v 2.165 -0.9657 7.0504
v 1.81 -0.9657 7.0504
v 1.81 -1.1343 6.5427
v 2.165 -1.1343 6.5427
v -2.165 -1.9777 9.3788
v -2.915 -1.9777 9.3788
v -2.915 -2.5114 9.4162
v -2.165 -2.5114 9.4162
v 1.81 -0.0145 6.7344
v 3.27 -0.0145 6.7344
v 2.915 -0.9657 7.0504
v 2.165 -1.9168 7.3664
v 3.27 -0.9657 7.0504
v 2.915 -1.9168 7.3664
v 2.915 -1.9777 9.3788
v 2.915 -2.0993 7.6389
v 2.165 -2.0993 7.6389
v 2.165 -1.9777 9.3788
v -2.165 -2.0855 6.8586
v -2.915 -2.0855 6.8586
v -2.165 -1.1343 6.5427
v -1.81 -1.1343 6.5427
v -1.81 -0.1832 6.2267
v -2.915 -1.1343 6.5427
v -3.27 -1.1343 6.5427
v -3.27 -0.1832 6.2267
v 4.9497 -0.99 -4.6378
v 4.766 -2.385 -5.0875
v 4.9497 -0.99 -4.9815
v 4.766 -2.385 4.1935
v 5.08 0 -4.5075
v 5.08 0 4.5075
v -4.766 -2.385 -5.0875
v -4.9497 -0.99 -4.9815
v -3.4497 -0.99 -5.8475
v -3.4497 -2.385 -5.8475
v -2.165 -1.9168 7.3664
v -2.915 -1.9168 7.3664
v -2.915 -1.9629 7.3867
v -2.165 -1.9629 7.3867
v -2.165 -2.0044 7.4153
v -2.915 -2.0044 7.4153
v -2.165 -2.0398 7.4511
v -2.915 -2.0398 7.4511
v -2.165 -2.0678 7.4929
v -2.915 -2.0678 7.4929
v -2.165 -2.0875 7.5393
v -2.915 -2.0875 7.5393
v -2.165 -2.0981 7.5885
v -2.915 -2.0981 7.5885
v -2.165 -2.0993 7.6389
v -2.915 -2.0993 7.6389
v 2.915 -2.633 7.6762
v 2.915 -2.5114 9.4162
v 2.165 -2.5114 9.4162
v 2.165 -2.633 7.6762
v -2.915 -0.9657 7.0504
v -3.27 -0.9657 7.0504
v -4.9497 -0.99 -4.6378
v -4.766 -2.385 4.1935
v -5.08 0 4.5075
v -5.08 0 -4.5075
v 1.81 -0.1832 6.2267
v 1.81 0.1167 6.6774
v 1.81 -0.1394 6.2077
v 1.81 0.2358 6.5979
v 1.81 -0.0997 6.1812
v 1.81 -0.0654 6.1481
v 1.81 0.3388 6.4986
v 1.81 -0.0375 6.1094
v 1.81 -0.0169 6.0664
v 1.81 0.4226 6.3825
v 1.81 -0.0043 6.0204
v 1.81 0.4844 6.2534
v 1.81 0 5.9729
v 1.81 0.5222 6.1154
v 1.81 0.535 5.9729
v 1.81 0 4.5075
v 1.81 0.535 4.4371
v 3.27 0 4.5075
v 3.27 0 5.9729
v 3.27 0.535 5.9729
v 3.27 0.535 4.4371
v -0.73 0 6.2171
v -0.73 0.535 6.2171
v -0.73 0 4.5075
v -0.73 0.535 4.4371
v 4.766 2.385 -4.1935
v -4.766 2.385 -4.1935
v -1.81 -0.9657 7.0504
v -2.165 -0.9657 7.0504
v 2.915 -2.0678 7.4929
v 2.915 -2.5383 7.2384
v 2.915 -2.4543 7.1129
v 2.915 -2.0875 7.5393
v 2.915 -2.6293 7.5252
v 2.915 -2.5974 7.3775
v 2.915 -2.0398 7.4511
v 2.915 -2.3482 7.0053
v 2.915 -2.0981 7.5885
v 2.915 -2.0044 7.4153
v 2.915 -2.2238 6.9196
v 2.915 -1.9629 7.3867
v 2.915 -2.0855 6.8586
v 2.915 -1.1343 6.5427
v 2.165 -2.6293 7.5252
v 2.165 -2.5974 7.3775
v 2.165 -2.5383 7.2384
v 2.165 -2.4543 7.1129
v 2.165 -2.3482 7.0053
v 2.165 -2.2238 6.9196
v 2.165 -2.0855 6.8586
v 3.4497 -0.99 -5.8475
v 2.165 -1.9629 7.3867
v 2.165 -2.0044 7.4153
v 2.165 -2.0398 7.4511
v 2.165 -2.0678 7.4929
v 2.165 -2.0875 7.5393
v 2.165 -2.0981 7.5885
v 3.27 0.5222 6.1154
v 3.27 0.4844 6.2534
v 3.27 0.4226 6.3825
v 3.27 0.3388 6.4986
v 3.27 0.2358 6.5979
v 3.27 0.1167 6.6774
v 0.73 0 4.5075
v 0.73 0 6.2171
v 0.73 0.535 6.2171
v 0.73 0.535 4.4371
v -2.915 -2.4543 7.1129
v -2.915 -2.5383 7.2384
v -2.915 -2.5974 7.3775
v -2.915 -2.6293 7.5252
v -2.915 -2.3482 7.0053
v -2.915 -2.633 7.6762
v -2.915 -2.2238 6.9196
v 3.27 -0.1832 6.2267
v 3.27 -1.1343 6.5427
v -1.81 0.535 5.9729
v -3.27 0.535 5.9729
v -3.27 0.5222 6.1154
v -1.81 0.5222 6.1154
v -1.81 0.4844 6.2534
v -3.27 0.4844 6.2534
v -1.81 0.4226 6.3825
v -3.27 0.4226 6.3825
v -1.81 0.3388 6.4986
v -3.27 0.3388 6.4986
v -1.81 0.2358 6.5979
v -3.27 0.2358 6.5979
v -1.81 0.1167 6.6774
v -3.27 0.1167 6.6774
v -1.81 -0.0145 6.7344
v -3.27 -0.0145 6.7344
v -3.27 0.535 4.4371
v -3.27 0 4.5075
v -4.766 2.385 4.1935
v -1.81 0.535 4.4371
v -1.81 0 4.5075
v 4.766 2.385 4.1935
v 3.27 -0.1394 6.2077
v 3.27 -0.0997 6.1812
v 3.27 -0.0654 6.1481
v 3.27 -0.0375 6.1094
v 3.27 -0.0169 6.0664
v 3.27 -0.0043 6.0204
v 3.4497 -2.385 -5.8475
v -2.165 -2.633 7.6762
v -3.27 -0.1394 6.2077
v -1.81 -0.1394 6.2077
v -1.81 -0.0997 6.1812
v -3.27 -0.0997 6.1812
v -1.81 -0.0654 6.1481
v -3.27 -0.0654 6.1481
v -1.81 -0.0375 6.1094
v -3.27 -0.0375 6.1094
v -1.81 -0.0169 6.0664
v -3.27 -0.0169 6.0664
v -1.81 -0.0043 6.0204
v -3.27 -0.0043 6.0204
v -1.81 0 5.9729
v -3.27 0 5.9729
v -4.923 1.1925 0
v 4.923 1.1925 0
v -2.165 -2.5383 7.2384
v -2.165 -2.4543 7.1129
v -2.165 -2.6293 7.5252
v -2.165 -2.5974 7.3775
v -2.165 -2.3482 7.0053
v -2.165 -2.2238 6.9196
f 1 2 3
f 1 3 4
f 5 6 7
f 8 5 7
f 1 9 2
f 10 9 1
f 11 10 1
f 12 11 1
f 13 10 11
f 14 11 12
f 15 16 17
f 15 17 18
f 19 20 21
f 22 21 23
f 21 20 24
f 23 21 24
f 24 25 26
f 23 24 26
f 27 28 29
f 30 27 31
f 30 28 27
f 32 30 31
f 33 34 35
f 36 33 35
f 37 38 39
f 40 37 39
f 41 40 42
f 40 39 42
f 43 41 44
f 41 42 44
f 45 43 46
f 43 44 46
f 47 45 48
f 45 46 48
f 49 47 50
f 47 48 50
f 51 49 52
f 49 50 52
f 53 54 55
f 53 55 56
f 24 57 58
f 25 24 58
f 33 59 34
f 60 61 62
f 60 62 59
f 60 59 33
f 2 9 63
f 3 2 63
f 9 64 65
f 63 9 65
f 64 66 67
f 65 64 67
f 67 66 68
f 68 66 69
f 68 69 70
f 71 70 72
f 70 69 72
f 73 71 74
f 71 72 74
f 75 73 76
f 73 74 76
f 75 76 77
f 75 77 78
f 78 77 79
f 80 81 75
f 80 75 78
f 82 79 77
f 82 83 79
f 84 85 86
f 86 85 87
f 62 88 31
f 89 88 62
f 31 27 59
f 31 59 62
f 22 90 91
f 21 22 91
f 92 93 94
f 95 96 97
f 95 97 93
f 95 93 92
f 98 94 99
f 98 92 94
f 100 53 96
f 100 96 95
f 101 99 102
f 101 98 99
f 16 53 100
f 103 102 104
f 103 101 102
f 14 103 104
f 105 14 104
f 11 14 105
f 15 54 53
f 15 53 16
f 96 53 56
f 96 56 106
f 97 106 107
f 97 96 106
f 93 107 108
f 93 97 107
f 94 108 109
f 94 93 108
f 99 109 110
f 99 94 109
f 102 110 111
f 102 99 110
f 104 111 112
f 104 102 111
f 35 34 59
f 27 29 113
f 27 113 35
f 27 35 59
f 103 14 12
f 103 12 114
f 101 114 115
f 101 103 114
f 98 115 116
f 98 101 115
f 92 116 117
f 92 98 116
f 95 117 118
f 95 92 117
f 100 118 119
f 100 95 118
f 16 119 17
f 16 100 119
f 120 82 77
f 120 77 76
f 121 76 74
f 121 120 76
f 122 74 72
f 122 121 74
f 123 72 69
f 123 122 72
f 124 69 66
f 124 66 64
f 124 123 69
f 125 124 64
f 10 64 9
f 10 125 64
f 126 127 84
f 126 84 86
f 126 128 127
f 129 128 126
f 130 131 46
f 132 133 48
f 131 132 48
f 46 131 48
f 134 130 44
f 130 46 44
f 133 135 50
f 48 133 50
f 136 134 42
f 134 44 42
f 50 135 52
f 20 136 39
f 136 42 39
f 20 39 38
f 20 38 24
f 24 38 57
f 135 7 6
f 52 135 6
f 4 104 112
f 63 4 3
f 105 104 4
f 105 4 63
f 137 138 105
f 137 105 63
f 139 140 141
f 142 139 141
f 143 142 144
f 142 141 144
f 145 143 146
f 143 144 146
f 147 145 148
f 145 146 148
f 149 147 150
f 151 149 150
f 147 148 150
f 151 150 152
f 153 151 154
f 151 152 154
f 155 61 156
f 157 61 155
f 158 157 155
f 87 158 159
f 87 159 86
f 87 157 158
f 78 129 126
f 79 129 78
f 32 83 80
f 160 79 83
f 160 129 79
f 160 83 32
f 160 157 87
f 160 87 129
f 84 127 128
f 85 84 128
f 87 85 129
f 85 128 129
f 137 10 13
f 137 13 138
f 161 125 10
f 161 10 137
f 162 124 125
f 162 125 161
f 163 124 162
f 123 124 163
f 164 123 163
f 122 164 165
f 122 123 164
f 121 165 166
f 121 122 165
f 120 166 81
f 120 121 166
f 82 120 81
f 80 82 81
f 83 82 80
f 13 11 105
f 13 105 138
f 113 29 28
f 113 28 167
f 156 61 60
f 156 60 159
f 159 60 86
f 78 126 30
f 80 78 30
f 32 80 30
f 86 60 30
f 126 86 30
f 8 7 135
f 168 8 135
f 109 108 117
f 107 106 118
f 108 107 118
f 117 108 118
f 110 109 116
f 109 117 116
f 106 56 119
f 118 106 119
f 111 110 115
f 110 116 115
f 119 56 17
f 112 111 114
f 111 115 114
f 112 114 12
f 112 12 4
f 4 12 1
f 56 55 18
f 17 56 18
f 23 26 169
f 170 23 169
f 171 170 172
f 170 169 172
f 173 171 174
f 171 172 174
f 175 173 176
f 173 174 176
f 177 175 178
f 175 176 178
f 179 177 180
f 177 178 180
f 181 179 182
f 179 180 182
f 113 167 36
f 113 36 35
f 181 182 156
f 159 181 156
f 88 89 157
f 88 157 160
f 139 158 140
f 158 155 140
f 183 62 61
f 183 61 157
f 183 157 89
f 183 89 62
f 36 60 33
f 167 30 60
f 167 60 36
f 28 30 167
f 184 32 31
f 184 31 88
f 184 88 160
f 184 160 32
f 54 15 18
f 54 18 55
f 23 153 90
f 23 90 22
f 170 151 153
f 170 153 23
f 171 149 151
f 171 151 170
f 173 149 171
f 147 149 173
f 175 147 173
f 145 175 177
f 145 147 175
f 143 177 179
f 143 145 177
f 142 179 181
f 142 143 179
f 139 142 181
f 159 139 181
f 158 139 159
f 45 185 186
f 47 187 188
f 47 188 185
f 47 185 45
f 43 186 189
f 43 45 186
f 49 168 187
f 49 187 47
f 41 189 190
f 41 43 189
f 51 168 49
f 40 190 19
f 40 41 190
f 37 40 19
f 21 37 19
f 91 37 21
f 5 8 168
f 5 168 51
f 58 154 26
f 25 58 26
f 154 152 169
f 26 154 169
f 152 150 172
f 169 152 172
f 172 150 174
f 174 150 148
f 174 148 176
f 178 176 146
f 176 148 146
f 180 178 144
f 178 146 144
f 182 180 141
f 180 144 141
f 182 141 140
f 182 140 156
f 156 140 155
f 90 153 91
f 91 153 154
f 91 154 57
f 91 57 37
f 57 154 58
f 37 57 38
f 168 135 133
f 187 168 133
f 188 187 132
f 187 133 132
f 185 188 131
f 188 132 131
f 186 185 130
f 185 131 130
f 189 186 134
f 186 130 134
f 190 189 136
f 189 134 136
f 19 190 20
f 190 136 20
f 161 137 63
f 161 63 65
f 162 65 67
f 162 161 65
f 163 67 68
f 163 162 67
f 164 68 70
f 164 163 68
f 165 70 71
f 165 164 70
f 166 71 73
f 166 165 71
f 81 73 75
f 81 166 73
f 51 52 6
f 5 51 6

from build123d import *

# Parameters (mm, degrees)
SKETCH1_W                  = 10.16
SKETCH1_H                  = 9.015
EXTRUDE1_DEPTH             = 2.385
EXTRUDE1_TAPER             = 7.5
EXTRUDE1_OTHER_WAY_DEPTH   = 2.385
EXTRUDE1_OTHER_WAY_TAPER   = 7.5
EXTRUDE2_REACH             = 9.198
EXTRUDE2_DIRECTION_2_REACH = 9.198
CUT_EXTRUDE5_REACH         = 11.097
EXTRUDE5_DEPTH             = 0.73
SKETCH29_W                 = 1.78
SKETCH29_H                 = 0.535
EXTRUDE6_DEPTH             = 0.73
CUT_EXTRUDE8_REACH         = 20.49
SKETCH34_W                 = 0.355
SKETCH34_H                 = 2.212694359


with BuildPart() as part:
    # Sketch1 → Extrude1 (new body)
    with BuildSketch(Plane(origin=(0, 0, 0), x_dir=(1, 0, 0), z_dir=(0, 1, 0))):
        Rectangle(SKETCH1_W, SKETCH1_H)
    extrude(amount=EXTRUDE1_DEPTH, taper=EXTRUDE1_TAPER)

    # Sketch1 → Extrude1 other way (add)
    with BuildSketch(Plane(origin=(0, 0, 0), x_dir=(1, 0, 0), z_dir=(0, 1, 0))):
        Rectangle(SKETCH1_W, SKETCH1_H)
    extrude(amount=-EXTRUDE1_OTHER_WAY_DEPTH, taper=EXTRUDE1_OTHER_WAY_TAPER)

    # Extrude2: up to this plane
    extrude2_end = Plane(origin=(5.08, 0, -4.5075), z_dir=(0.9914448613738104, -0.13052619222005188, 0))
    # Sketch2 → Extrude2 (add, up to the surface)
    with BuildSketch(Plane(origin=(0, 0, 0), x_dir=(0, 0, -1), z_dir=(1, 0, 0)), mode=Mode.PRIVATE) as extrude2_sk1:
        Polygon((4.5075, 0), (4.193508793, -2.385), (5.8475, -2.385), (5.8475, -0.99), (4.637835973, -0.99), align=None)
    extrude2_tool1 = split(extrude(extrude2_sk1.sketch, amount=EXTRUDE2_REACH, mode=Mode.PRIVATE), bisect_by=extrude2_end, keep=Keep.BOTH, mode=Mode.PRIVATE)
    add(extrude2_tool1.solids().sort_by_distance((0, -1.642965, -5.034325))[0])

    # Extrude2 direction 2: up to this plane
    extrude2_direction_2_end = Plane(origin=(-5.08, 0, -4.5075), z_dir=(-0.9914448613738104, -0.13052619222005188, 0))
    # Sketch2 → Extrude2 direction 2 (add, up to the surface)
    with BuildSketch(Plane(origin=(0, 0, 0), x_dir=(0, 0, -1), z_dir=(1, 0, 0)), mode=Mode.PRIVATE) as extrude2_direction_2_sk1:
        Polygon((4.5075, 0), (4.193508793, -2.385), (5.8475, -2.385), (5.8475, -0.99), (4.637835973, -0.99), align=None)
    extrude2_direction_2_tool1 = split(extrude(extrude2_direction_2_sk1.sketch, amount=-EXTRUDE2_DIRECTION_2_REACH, mode=Mode.PRIVATE), bisect_by=extrude2_direction_2_end, keep=Keep.BOTH, mode=Mode.PRIVATE)
    add(extrude2_direction_2_tool1.solids().sort_by_distance((0, -1.642965, -5.034325))[0])

    # Sketch27 → Cut-Extrude5 (cut, up to next)
    with BuildSketch(Plane(origin=(0, 2.385, 0), x_dir=(1, 0, 0), z_dir=(0, 1, 0)), mode=Mode.PRIVATE) as cut_extrude5_sk1:
        Polygon((3.449664027, 5.8475), (4.949664027, 5.8475), (4.949664027, 4.981474596), align=None)
    cut_extrude5_tool1 = extrude(cut_extrude5_sk1.sketch, amount=-CUT_EXTRUDE5_REACH, mode=Mode.PRIVATE) & part.part
    # Sketch27 → Cut-Extrude5 (cut, up to next)
    with BuildSketch(Plane(origin=(0, 2.385, 0), x_dir=(1, 0, 0), z_dir=(0, 1, 0)), mode=Mode.PRIVATE) as cut_extrude5_sk2:
        Polygon((-4.949664027, 4.981474596), (-3.449664027, 5.8475), (-4.949664027, 5.8475), align=None)
    cut_extrude5_tool2 = extrude(cut_extrude5_sk2.sketch, amount=-CUT_EXTRUDE5_REACH, mode=Mode.PRIVATE) & part.part
    add(cut_extrude5_tool1.solids().sort_by_distance((4.449664, 2.385, -5.558825))[0], mode=Mode.SUBTRACT)
    add(cut_extrude5_tool2.solids().sort_by_distance((-4.449664, 2.385, -5.558825))[0], mode=Mode.SUBTRACT)

    # Sketch28 → Extrude5 (add, symmetric)
    with BuildSketch(Plane(origin=(2.54, 0, 0), x_dir=(0, 0, -1), z_dir=(1, 0, 0))):
        with BuildLine():
            Line((-4.437065914, 0.535), (-5.972851804, 0.535))
            ThreePointArc((-5.972851804, 0.535), (-6.442417164, 0.383280011), (-6.734431244, -0.014511844))
            Line((-6.734431244, -0.014511844), (-7.366359813, -1.916829385))
            ThreePointArc((-7.366359813, -1.916829385), (-7.47136382, -2.054757056), (-7.638879483, -2.099348383))
            Line((-7.638879483, -2.099348383), (-9.378840143, -1.977678482))
            Line((-9.378840143, -1.977678482), (-9.416159857, -2.511375248))
            Line((-9.416159857, -2.511375248), (-7.676199197, -2.63304515))
            ThreePointArc((-7.676199197, -2.63304515), (-7.173652208, -2.499271168), (-6.858640187, -2.085488156))
            Line((-6.858640187, -2.085488156), (-6.226711617, -0.183170615))
            ThreePointArc((-6.226711617, -0.183170615), (-6.129373591, -0.05057333), (-5.972851804, 0))
            Line((-5.972851804, 0), (-4.437065914, 0))
            Line((-4.437065914, 0), (-4.437065914, 0.535))
        make_face()
    extrude5 = extrude(amount=EXTRUDE5_DEPTH, both=True)

    # Sketch29 → Extrude6 (add, symmetric)
    with BuildSketch(Plane(origin=(0, 0, 0), x_dir=(0, 0, -1), z_dir=(1, 0, 0))):
        with Locations((-5.327065914, 0.2675)):
            Rectangle(SKETCH29_W, SKETCH29_H)
    extrude(amount=EXTRUDE6_DEPTH, both=True)

    # Mirror1: Extrude5 across plane
    add(extrude5.mirror(Plane(origin=(0, 0, 0), x_dir=(0, 0, 1), z_dir=(1, 0, 0))))

    # Sketch34 → Cut-Extrude8 (cut, up to next)
    with BuildSketch(Plane(origin=(0, 3.589581516, 10.805847706), x_dir=(1, 0, 0), z_dir=(0, 0.3152500380612474, 0.9490086477489982)), mode=Mode.PRIVATE) as cut_extrude8_sk1:
        with Locations((3.0925, -4.245414402)):
            Rectangle(SKETCH34_W, SKETCH34_H)
    cut_extrude8_tool1 = extrude(cut_extrude8_sk1.sketch, amount=-CUT_EXTRUDE8_REACH, mode=Mode.PRIVATE) & part.part
    # Sketch34 → Cut-Extrude8 (cut, up to next)
    with BuildSketch(Plane(origin=(0, 3.589581516, 10.805847706), x_dir=(1, 0, 0), z_dir=(0, 0.3152500380612474, 0.9490086477489982)), mode=Mode.PRIVATE) as cut_extrude8_sk2:
        with Locations((1.9875, -4.245414402)):
            Rectangle(SKETCH34_W, SKETCH34_H)
    cut_extrude8_tool2 = extrude(cut_extrude8_sk2.sketch, amount=-CUT_EXTRUDE8_REACH, mode=Mode.PRIVATE) & part.part
    cut_extrude8_1 = cut_extrude8_tool1.solids().sort_by_distance((3.0925, -0.439353, 12.144215))[0]
    add(cut_extrude8_1, mode=Mode.SUBTRACT)
    cut_extrude8_2 = cut_extrude8_tool2.solids().sort_by_distance((1.9875, -0.439353, 12.144215))[0]
    add(cut_extrude8_2, mode=Mode.SUBTRACT)
    cut_extrude8 = cut_extrude8_1 + cut_extrude8_2  # Cut-Extrude8 as one shape, for the pattern or mirror that repeats it

    # Mirror2: Cut-Extrude8 across plane
    add(cut_extrude8.mirror(Plane(origin=(0, 0, 0), x_dir=(0, 0, 1), z_dir=(1, 0, 0))), mode=Mode.SUBTRACT)


solid = part.part
